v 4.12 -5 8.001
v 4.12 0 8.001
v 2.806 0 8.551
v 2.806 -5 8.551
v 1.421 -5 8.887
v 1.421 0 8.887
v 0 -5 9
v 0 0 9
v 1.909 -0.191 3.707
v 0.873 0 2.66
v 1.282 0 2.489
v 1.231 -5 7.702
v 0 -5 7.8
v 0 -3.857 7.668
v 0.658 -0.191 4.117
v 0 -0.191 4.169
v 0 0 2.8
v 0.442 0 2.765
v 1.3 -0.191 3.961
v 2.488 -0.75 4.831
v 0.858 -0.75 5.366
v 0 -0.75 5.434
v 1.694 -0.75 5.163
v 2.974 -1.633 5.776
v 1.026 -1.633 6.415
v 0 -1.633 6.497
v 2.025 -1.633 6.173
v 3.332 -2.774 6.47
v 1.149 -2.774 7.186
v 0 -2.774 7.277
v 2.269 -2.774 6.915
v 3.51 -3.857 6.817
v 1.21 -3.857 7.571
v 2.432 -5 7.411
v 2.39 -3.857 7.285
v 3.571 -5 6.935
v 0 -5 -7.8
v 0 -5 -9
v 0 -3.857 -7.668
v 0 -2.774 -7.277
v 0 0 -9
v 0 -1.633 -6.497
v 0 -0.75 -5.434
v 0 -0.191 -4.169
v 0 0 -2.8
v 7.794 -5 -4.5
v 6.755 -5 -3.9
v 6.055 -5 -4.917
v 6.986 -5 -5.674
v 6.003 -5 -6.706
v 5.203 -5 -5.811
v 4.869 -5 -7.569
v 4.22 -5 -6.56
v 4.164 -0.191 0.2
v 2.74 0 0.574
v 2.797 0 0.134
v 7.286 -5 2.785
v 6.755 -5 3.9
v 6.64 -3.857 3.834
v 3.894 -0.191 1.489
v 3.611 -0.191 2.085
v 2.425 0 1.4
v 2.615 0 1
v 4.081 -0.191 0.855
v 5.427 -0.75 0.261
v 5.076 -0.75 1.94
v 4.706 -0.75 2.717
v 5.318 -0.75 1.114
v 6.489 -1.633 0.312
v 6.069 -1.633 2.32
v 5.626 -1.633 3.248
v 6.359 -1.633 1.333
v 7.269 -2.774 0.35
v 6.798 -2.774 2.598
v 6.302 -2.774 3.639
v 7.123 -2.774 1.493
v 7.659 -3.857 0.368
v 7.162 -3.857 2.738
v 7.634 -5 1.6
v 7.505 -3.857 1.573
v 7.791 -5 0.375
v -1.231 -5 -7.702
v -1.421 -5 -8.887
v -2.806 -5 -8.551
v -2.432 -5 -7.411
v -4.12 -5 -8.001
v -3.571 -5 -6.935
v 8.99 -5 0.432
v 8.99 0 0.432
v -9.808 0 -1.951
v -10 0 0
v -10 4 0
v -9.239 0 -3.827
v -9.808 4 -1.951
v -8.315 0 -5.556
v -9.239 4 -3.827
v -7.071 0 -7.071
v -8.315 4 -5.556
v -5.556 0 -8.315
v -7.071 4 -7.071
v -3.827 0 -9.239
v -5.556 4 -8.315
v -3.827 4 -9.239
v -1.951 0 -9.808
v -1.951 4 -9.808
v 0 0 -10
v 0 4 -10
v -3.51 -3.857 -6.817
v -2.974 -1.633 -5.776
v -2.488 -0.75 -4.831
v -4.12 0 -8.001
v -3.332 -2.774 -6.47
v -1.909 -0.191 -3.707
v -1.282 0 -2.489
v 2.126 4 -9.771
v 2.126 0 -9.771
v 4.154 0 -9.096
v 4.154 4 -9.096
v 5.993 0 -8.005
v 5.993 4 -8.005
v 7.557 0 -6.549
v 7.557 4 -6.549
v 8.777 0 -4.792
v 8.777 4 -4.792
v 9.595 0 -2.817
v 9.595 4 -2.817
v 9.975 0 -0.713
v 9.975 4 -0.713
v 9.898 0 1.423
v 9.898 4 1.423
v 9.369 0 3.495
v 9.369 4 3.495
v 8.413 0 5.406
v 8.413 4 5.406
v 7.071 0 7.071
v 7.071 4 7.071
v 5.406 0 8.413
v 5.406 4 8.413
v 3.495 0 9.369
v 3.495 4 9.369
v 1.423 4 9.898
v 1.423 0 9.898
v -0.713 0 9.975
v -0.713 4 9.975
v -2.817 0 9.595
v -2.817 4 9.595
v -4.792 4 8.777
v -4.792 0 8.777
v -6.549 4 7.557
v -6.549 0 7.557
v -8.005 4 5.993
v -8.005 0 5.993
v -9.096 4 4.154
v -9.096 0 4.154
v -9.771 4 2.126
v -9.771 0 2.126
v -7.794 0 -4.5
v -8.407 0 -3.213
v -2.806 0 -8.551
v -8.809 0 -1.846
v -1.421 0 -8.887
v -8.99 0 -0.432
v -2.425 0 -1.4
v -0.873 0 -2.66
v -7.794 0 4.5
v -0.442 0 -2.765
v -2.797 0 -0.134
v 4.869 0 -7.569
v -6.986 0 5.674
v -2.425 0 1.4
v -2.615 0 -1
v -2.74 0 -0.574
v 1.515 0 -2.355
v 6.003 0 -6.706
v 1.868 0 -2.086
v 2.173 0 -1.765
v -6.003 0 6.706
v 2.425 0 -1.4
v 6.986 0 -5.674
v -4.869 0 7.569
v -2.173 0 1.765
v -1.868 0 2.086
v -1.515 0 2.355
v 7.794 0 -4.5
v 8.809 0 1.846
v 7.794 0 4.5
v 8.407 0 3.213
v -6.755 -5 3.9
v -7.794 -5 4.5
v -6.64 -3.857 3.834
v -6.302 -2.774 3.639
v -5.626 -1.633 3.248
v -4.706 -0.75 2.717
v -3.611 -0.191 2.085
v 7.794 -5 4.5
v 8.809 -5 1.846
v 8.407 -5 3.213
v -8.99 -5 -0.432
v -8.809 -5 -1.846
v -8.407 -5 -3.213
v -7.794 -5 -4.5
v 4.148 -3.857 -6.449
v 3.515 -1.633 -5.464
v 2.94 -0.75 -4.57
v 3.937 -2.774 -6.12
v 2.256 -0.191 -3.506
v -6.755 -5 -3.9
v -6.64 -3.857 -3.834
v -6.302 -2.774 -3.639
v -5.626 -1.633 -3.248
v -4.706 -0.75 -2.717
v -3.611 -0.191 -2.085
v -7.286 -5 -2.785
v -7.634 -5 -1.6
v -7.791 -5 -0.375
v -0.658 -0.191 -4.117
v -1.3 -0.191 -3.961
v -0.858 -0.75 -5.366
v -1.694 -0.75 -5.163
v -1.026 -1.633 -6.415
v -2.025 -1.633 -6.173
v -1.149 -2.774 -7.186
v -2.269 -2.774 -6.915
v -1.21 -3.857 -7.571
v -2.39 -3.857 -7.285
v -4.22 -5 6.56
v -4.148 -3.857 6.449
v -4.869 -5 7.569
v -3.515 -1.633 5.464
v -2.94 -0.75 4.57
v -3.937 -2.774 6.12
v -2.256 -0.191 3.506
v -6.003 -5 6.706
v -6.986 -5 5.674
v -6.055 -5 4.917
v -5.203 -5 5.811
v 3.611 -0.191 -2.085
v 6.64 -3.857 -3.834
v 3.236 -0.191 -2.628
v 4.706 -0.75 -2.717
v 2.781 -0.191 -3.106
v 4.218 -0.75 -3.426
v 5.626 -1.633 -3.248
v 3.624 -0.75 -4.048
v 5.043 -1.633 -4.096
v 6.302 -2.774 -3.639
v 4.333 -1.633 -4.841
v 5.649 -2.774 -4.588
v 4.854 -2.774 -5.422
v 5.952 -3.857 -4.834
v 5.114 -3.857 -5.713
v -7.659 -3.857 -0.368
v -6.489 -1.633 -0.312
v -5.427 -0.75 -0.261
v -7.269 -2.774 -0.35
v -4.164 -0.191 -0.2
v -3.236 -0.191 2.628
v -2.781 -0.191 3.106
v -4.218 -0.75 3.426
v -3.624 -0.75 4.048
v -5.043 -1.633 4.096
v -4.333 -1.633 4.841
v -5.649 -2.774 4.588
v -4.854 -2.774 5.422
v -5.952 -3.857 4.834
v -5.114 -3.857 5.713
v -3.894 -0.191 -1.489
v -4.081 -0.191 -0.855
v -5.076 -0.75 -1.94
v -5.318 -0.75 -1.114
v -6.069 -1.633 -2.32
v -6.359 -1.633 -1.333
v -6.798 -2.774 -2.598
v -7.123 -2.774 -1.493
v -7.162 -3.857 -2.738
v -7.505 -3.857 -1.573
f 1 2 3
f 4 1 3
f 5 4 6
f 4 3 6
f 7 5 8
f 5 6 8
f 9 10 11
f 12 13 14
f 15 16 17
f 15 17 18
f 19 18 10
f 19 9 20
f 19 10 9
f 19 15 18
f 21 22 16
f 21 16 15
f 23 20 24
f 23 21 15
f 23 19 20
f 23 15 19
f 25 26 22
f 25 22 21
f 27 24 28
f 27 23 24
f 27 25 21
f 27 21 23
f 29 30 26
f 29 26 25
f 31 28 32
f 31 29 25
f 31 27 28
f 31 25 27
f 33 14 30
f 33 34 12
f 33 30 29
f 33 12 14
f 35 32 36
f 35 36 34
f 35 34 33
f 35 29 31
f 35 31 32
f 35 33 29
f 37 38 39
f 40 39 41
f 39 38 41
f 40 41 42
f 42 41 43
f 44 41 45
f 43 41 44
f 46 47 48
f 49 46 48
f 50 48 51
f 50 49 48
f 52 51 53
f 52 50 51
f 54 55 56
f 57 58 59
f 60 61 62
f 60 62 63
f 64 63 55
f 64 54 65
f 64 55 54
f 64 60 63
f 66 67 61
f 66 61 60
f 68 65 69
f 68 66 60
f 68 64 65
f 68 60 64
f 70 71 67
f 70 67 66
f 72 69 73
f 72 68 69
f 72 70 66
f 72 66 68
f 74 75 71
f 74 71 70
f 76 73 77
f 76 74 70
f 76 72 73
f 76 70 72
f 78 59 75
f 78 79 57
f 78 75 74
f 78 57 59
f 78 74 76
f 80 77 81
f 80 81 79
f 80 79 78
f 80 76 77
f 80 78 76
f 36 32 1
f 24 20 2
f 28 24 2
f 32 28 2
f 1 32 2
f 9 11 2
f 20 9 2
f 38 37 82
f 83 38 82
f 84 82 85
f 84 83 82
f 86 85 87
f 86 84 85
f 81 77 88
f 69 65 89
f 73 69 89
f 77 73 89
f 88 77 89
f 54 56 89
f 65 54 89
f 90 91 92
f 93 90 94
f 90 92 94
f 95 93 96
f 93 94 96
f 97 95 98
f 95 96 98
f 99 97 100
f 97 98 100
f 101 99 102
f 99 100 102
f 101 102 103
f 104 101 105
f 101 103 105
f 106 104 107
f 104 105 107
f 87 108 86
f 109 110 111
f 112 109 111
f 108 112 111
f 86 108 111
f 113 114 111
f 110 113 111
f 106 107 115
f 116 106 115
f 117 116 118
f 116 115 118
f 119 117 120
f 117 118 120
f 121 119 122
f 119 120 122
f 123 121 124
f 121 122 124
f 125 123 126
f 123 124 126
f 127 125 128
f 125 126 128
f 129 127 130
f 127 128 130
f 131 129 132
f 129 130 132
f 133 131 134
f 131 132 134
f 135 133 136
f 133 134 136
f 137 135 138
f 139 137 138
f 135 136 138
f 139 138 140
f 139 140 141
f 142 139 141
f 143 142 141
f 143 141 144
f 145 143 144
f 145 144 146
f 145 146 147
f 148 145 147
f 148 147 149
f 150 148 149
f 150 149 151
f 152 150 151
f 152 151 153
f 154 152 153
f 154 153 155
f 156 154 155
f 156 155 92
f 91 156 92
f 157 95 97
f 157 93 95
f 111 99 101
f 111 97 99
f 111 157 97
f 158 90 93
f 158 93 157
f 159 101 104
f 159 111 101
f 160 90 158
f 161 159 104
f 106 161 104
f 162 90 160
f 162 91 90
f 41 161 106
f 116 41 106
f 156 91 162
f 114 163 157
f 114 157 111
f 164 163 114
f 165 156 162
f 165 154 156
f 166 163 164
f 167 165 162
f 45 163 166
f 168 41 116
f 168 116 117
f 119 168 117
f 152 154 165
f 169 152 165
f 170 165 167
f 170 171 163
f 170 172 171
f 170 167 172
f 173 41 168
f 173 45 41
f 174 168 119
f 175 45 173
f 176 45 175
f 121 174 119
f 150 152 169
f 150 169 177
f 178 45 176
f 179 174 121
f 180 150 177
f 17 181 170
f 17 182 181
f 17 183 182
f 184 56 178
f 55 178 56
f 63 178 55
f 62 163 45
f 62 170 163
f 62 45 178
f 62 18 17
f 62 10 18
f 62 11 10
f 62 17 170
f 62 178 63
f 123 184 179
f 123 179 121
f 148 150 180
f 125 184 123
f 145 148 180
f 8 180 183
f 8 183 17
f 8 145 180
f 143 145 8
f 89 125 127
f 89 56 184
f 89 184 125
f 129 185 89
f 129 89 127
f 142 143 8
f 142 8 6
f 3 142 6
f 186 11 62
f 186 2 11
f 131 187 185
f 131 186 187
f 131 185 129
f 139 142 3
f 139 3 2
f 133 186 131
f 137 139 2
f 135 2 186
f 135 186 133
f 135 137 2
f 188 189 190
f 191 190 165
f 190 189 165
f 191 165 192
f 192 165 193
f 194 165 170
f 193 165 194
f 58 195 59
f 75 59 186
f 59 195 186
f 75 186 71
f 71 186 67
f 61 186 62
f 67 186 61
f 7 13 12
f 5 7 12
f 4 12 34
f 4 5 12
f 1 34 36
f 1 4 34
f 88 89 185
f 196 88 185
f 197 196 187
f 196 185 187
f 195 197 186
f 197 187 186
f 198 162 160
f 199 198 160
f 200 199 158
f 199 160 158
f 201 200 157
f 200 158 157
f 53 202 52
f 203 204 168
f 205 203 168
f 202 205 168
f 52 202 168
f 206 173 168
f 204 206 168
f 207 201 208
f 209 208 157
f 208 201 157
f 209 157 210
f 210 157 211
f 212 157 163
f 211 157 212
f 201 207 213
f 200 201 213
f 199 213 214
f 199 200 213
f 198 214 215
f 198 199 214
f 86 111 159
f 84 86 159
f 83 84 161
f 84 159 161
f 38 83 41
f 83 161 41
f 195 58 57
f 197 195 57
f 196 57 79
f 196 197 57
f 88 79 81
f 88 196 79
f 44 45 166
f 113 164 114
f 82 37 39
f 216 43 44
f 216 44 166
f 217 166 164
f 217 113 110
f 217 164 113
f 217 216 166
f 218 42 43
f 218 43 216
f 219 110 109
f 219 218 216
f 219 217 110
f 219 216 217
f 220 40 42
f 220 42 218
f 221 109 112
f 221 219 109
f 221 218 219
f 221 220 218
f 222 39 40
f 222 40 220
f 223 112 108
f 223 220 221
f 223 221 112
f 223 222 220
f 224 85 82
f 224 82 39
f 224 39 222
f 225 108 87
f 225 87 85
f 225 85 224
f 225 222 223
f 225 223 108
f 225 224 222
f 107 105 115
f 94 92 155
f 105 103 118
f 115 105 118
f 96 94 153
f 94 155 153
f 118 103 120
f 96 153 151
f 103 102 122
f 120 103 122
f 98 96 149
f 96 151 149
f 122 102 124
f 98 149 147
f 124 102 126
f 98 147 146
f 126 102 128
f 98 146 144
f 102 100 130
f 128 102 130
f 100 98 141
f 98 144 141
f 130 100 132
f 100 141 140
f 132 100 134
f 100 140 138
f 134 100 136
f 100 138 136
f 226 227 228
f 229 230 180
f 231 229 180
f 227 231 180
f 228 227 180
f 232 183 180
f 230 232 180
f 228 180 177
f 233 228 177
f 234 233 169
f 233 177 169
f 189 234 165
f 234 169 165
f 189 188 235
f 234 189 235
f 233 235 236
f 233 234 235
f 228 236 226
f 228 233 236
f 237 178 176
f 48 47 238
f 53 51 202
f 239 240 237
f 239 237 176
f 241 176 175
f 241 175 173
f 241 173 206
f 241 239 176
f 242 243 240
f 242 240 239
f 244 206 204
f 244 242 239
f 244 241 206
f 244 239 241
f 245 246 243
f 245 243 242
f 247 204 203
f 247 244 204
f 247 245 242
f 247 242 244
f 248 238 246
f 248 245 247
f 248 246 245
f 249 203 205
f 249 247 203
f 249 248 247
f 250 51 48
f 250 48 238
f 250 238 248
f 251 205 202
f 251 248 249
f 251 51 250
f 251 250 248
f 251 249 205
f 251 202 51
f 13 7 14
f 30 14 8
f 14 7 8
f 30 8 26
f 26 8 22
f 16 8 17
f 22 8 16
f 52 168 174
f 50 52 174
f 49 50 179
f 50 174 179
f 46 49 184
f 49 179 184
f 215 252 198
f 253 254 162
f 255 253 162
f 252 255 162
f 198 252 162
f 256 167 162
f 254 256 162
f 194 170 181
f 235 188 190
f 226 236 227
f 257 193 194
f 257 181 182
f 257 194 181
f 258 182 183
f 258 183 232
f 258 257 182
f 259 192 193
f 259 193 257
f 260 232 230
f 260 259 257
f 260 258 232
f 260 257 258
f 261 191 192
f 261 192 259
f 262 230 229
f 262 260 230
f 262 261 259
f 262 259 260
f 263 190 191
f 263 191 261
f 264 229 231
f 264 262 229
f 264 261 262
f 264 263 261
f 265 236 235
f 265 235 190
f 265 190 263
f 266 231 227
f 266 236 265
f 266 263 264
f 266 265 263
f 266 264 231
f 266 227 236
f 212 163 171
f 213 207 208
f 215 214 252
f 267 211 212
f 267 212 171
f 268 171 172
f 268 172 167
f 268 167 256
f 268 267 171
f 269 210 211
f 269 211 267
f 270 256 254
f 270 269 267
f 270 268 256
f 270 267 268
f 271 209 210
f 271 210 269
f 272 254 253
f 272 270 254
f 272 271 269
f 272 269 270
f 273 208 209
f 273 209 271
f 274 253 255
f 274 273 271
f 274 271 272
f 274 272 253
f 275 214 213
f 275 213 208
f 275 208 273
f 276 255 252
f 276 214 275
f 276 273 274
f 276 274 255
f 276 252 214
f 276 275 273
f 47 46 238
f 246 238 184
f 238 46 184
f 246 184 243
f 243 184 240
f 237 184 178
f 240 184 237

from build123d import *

# Parameters (mm, degrees)
F2_DEPTH        = 5
F2_COPIES_COUNT = 6
F4_R            = 13.5
F5_DEPTH        = 4
F6_R            = 4.99999
F8_DEPTH        = 6
F10_DEPTH       = 1.5
F11_R           = 23.1793955011
F12_DEPTH       = 25


# Not quite as in the source:
# - a fillet or chamfer is up to 0.001 mm smaller than in the source, because OpenCascade refuses the exact size
# - a pattern or mirror of a feature is missing from the dataset's text; its kind, count and spacing are read off the source's solid


with BuildPart() as f2:
    # F1 (on Front) → F2 (new body)
    with BuildSketch(Plane.XZ):
        with BuildLine():
            Line((3.5710217678, 6.9345370094), (4.120409732, 8.001388857))
            ThreePointArc((4.120409732, 8.001388857), (2.1198467265, 8.7467851155), (0, 9))
            Line((0, 9), (0, 7.8))
            ThreePointArc((0, 7.8), (1.8372004963, 7.5805471001), (3.5710217678, 6.9345370094))
        make_face()
    extrude(amount=F2_DEPTH)


with BuildPart() as f2_copies_1:
    # F2_copies: instance of F2
    add(f2.part.rotate(Axis((0, 0, 0), (0, 1, 0)), 1 * 360 / F2_COPIES_COUNT))


with BuildPart() as f2_copies_2:
    # F2_copies: instance of F2
    add(f2.part.rotate(Axis((0, 0, 0), (0, 1, 0)), 2 * 360 / F2_COPIES_COUNT))


with BuildPart() as f2_copies_3:
    # F2_copies: instance of F2
    add(f2.part.rotate(Axis((0, 0, 0), (0, 1, 0)), 3 * 360 / F2_COPIES_COUNT))


with BuildPart() as f2_copies_4:
    # F2_copies: instance of F2
    add(f2.part.rotate(Axis((0, 0, 0), (0, 1, 0)), 4 * 360 / F2_COPIES_COUNT))


with BuildPart() as f2_copies_5:
    # F2_copies: instance of F2
    add(f2.part.rotate(Axis((0, 0, 0), (0, 1, 0)), 5 * 360 / F2_COPIES_COUNT))


with BuildPart() as f2_1:
    add(f2.part)

    add(f2_copies_1.part)  # F5 merges F2_copies_1

    add(f2_copies_2.part)  # F5 merges F2_copies_2

    add(f2_copies_3.part)  # F5 merges F2_copies_3

    add(f2_copies_4.part)  # F5 merges F2_copies_4

    add(f2_copies_5.part)  # F5 merges F2_copies_5
    # F4 (on Front) → F5 (join)
    with BuildSketch(Plane.XZ):
        with Locations((0, 3.5)):
            Circle(F4_R)
    extrude(amount=-F5_DEPTH)

    # F6 (radius 5 in the source; OpenCascade refuses exactly that, so slightly less here)
    f6_edges = [f2_1.edges().sort_by_distance(p)[0] for p in [
        (-1.8372, 0, -7.580547),
        (-7.483547, 0, -2.199211),
        (5.646346, 0, -5.381336),
        (-5.646346, 0, 5.381336),
        (7.483547, 0, 2.199211),
        (1.8372, 0, 7.580547),
    ]]
    fillet(f6_edges, radius=F6_R)

    # F7 (on face) → F8 (join)
    with BuildSketch(Plane.XZ):
        with BuildLine():
            ThreePointArc((-10, 0), (0, 10), (10, 0))
            Line((10, 0), (12, 0))
            ThreePointArc((12, 0), (0, 12), (-12, 0))
            Line((-12, 0), (-10, 0))
        make_face()
    extrude(amount=F8_DEPTH)

    # F9 (on face) → F10 (join)
    with BuildSketch(Plane.XZ.offset(6)):
        with BuildLine():
            Line((12, 0), (13.5, 0))
            ThreePointArc((13.5, 0), (0, 13.5), (-13.5, 0))
            Line((-13.5, 0), (-12, 0))
            ThreePointArc((-12, 0), (0, 12), (12, 0))
        make_face()
        with BuildLine():
            Line((10, 0), (12, 0))
            ThreePointArc((12, 0), (0, 12), (-12, 0))
            Line((-12, 0), (-10, 0))
            ThreePointArc((-10, 0), (0, 10), (10, 0))
        make_face()
    extrude(amount=F10_DEPTH)

    # F11 (on face) → F12 (cut)
    with BuildSketch(Plane(origin=(0, 4, 0), x_dir=(-1, 0, 0), z_dir=(0, 1, 0))):
        Circle(F11_R)
        with BuildLine():
            ThreePointArc((13.5, 3.5), (9.5459415677, -6.0459415243), (6.13e-08, -10))
            ThreePointArc((6.13e-08, -10), (-9.5459415677, 13.0459415243), (13.5, 3.5))
        make_face(mode=Mode.SUBTRACT)
        with BuildLine():
            ThreePointArc((13.5, 3.5), (-9.5459415677, 13.0459415243), (6.13e-08, -10))
            ThreePointArc((6.13e-08, -10), (9.5459415677, -6.0459415243), (13.5, 3.5))
        make_face()
        with BuildLine():
            ThreePointArc((6.13e-08, -10), (-7.0710678335, 7.0710677902), (10, 0))
            ThreePointArc((10, 0), (7.0710678335, -7.0710677902), (6.13e-08, -10))
        make_face(mode=Mode.SUBTRACT)
    extrude(amount=-F12_DEPTH, mode=Mode.SUBTRACT)


solid = f2_1.part
